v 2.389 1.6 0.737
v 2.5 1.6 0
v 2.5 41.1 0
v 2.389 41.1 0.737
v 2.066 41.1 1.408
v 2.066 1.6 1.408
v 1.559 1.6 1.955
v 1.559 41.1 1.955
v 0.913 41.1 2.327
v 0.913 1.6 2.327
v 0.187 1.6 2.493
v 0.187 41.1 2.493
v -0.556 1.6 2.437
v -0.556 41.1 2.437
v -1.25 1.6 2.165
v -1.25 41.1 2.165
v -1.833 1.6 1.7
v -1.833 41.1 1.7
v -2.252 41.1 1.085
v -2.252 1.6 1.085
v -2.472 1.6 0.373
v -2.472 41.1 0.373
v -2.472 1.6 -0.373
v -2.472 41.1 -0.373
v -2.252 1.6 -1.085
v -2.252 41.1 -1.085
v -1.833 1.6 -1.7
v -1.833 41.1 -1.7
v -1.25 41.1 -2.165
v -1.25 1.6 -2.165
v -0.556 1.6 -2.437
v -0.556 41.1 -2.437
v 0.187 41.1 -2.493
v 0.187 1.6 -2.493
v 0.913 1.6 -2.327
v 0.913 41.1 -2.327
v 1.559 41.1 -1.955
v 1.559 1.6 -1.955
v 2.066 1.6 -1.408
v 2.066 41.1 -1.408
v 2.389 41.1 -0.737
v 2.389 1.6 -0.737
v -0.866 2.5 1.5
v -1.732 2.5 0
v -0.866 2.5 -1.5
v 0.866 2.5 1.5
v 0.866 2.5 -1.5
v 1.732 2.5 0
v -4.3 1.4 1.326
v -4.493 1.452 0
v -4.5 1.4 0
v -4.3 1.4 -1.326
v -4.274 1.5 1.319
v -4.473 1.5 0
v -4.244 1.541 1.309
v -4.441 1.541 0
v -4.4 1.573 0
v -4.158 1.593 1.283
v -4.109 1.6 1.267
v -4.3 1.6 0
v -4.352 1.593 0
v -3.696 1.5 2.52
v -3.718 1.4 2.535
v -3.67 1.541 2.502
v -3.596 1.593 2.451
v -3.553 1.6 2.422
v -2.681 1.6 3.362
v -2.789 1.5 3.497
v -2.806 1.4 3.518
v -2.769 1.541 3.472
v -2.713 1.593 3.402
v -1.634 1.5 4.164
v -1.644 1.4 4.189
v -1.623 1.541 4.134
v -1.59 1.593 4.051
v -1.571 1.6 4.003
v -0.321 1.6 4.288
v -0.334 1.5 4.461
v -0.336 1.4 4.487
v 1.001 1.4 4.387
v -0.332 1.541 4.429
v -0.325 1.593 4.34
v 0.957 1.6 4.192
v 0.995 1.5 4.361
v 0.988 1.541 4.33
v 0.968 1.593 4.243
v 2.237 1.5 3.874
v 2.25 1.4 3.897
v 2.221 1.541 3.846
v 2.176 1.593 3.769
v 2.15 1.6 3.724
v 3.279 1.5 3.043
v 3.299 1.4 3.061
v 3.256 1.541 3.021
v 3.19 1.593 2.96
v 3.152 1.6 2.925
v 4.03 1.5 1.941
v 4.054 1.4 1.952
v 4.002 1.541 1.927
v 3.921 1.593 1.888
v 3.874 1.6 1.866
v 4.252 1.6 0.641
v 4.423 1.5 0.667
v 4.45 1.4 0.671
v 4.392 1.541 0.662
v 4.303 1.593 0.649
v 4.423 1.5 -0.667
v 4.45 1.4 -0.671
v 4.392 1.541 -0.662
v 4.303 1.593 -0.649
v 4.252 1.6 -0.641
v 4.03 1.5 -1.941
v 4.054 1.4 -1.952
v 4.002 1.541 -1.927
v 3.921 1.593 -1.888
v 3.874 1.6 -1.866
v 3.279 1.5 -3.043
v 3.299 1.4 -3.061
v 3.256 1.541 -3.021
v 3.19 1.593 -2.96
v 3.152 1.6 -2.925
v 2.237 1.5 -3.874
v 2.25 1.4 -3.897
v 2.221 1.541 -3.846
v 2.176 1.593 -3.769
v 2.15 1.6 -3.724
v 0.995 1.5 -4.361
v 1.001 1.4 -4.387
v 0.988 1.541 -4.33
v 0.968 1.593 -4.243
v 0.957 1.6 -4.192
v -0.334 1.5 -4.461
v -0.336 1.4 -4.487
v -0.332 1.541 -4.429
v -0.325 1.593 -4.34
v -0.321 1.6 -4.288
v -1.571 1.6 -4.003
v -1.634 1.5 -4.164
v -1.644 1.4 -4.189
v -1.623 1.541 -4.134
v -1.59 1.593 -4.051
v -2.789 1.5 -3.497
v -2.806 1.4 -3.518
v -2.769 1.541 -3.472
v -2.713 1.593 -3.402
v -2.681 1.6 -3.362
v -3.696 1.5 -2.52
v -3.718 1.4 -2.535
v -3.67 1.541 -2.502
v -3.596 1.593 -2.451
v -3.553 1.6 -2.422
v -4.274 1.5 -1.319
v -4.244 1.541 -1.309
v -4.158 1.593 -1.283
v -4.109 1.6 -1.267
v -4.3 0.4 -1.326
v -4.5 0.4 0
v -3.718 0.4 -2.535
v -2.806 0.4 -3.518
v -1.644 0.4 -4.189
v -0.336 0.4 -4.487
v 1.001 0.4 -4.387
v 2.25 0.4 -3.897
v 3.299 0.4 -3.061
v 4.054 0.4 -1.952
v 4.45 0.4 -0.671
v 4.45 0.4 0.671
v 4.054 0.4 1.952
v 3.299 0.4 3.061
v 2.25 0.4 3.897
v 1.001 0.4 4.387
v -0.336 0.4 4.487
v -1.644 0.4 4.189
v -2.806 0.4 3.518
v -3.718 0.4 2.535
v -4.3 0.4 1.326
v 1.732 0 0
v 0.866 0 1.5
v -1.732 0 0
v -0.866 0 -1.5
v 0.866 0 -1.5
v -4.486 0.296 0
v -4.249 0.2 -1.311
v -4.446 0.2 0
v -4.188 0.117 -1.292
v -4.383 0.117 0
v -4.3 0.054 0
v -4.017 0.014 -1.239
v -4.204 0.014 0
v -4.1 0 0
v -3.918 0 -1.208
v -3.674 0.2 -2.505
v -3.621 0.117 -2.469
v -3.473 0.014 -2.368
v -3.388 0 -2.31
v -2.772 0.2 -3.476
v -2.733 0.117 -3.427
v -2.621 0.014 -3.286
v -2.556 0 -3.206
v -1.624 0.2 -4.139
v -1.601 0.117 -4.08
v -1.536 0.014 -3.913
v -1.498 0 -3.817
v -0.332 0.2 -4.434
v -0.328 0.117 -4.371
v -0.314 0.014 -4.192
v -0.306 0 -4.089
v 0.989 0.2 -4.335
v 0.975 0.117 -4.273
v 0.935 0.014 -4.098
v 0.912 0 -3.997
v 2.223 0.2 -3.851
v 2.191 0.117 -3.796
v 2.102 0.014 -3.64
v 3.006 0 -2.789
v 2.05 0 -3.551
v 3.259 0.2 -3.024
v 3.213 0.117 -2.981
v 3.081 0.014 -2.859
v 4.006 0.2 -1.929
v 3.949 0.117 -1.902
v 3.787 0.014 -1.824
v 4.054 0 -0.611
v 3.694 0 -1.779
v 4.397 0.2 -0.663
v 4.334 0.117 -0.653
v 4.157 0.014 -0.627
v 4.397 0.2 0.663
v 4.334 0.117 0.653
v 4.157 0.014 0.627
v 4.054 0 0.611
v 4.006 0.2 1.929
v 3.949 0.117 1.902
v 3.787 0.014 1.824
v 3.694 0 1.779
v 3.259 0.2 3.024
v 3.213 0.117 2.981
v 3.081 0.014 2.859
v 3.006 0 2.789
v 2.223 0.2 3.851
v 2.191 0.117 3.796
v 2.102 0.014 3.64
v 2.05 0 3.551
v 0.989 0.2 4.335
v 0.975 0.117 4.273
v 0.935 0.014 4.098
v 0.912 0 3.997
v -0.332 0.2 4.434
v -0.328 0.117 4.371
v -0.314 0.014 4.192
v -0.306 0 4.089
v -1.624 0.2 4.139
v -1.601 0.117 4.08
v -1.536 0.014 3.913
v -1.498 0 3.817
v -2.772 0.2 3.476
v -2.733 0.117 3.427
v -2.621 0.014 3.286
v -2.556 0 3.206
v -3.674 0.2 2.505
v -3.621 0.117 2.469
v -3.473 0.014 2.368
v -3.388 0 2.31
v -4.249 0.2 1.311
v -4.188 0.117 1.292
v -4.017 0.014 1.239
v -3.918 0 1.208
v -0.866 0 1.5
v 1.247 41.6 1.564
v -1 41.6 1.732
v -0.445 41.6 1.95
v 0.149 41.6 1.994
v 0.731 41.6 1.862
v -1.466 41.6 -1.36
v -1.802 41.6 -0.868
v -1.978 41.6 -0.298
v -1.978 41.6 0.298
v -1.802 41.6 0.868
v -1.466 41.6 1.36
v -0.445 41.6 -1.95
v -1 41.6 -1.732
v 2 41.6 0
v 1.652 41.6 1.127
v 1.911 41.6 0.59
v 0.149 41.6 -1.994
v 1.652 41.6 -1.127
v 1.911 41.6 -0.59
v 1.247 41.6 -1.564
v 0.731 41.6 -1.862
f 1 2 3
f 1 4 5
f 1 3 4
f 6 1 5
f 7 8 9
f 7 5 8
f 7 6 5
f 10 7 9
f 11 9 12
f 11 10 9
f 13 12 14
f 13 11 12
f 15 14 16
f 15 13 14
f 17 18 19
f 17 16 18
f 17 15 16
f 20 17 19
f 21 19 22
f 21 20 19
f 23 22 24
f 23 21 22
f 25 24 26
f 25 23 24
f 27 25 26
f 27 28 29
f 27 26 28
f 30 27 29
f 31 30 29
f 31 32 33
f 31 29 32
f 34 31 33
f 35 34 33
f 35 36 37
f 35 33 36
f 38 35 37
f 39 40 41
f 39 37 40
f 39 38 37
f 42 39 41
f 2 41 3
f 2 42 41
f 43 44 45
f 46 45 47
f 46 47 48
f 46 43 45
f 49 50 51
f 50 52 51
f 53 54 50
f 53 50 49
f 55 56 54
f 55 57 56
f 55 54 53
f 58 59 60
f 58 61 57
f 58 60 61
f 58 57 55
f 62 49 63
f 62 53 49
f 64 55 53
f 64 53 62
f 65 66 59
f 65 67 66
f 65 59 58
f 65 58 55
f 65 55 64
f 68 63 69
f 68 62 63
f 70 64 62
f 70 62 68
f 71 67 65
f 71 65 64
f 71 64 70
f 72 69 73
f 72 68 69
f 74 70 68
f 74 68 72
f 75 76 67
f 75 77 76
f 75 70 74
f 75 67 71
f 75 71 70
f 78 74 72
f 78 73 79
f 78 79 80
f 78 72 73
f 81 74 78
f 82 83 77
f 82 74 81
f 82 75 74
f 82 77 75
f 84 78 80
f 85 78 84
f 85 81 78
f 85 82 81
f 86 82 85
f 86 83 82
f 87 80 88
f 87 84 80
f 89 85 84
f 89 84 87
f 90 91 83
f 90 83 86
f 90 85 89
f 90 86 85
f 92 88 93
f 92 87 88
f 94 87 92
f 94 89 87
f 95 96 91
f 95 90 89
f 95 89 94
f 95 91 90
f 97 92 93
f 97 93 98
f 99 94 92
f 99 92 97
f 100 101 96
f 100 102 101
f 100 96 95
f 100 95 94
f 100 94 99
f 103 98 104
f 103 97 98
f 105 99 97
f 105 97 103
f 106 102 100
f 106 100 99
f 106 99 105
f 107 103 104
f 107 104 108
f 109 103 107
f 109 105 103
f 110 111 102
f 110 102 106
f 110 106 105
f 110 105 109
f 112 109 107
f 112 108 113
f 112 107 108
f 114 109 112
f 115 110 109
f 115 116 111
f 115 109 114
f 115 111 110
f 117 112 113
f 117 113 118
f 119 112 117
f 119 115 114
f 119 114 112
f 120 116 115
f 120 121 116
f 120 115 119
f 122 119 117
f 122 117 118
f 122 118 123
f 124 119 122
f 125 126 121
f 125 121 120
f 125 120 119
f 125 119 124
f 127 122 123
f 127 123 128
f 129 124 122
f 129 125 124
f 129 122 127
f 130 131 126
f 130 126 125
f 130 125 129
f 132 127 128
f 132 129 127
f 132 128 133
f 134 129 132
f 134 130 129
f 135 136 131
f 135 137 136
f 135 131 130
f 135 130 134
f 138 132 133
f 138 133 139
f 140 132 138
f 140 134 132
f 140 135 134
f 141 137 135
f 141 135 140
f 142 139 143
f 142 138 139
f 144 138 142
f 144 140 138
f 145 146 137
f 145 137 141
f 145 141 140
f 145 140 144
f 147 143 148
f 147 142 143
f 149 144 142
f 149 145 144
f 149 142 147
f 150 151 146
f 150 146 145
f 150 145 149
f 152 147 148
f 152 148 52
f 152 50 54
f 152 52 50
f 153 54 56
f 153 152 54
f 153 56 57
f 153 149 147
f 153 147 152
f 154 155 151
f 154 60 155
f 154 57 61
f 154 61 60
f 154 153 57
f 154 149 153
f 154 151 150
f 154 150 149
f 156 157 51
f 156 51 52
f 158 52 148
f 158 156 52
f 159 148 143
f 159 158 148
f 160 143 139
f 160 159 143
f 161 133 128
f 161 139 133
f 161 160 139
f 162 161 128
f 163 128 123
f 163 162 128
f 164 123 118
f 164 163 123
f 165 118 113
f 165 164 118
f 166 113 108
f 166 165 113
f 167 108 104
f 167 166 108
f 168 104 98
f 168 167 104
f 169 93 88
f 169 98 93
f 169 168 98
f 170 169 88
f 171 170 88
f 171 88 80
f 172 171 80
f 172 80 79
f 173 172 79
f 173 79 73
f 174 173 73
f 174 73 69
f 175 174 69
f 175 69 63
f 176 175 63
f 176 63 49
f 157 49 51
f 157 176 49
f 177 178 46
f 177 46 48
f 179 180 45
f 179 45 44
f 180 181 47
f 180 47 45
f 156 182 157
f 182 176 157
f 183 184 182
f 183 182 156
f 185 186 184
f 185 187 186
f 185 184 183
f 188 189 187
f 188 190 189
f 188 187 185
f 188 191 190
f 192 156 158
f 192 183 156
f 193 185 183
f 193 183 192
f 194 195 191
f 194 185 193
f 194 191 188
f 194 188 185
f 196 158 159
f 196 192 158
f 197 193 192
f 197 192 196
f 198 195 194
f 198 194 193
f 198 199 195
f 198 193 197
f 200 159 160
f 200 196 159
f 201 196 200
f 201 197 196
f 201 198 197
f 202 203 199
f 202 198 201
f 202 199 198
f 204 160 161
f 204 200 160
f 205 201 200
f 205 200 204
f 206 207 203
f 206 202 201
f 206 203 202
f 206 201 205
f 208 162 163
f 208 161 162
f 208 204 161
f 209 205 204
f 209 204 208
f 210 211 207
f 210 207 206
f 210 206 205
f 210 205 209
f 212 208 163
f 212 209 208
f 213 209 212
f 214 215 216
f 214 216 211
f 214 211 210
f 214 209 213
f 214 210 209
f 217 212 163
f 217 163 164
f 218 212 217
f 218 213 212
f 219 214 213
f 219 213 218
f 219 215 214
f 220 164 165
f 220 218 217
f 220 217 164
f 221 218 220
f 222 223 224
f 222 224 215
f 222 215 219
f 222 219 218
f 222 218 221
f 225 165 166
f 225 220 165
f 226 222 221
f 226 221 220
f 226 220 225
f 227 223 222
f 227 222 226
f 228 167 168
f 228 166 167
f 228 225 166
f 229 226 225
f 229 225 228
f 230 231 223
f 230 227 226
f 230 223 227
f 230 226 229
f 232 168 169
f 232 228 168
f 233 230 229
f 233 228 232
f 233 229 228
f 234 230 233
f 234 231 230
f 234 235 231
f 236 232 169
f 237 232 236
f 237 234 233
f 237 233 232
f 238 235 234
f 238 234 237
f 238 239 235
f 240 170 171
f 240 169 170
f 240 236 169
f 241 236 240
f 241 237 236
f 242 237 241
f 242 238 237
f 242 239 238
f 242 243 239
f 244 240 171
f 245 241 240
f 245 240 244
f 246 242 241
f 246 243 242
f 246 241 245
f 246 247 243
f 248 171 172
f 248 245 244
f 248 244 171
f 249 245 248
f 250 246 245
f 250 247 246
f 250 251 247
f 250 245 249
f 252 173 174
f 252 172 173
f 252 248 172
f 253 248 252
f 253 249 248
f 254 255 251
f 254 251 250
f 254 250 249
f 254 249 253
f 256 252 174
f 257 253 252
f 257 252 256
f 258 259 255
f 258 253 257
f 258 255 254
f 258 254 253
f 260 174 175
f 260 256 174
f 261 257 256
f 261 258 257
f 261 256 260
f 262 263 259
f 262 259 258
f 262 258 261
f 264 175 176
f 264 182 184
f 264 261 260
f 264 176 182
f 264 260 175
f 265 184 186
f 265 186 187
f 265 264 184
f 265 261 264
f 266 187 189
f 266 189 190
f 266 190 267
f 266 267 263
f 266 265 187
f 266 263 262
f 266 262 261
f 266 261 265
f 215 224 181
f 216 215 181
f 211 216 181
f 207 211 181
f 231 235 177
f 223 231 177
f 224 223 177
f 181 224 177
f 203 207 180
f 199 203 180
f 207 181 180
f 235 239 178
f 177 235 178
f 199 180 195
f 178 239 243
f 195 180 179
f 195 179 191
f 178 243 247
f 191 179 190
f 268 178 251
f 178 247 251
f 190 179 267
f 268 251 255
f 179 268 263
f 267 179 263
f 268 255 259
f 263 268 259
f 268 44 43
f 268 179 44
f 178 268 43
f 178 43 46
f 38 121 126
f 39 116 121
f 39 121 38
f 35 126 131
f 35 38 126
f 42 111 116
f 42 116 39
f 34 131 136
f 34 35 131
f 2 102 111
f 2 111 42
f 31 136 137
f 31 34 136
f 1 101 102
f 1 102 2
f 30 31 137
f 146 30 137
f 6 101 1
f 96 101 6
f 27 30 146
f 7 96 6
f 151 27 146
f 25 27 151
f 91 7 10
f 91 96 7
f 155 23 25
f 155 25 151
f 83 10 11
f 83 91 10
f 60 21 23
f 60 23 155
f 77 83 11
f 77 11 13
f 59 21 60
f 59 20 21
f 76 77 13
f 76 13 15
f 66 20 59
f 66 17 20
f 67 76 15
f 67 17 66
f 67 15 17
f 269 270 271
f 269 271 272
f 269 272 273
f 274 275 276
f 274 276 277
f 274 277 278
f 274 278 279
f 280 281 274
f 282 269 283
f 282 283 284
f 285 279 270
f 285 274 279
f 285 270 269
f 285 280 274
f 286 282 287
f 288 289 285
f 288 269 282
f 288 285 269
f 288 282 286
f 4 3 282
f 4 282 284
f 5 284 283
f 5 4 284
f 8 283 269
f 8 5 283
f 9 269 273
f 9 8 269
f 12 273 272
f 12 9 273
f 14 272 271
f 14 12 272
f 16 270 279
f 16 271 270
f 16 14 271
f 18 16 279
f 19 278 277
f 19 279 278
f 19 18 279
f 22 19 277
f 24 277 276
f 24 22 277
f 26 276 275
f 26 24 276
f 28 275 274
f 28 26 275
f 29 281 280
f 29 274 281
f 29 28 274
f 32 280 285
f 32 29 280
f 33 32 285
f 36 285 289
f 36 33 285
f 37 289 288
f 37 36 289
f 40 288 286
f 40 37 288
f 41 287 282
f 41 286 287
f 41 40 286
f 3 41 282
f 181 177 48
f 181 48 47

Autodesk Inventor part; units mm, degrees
ref_plane "YZ Plane" through (0, 0, 0) normal (1, 0, 0) x (0, 1, 0)
ref_plane "XZ Plane" through (0, 0, 0) normal (0, 1, 0) x (-1, 0, 0)
ref_plane "XY Plane" through (0, 0, 0) normal (0, 0, 1) x (1, 0, 0)
sketch "Boceto1" plane through (0, 0, 0) normal (0, 1, 0) x (-1, 0, 0)
  circle A0 centre (0, 0) radius 4.5
  dimension "d0" = 9
extrude "Extrusión1" add sketch "Boceto1" along normal blind 1.6
sketch "Boceto2" plane through (0, 1.6, 0) normal (0, 1, 0) x (1, 0, 0)
  circle A0 centre (0, 0) radius 2.5
  dimension "d3" = 5
extrude "Extrusión2" add sketch "Boceto2" along normal blind 40
fillet "Empalme1" radius 0.4 1 edges at (4.5, 0, 0)
fillet "Empalme2" radius 0.2 1 edges at (4.5, 1.6, 0)
sketch "Boceto3" plane through (0, 0, 0) normal (0, -1, 0) x (1, 0, 0)
  line L0 (-1.7321, 0) -> (-0.866, 1.5)
  line L1 (-0.866, 1.5) -> (0.866, 1.5)
  line L2 (0.866, 1.5) -> (1.7321, 0)
  line L3 (1.7321, 0) -> (0.866, -1.5)
  line L4 (0.866, -1.5) -> (-0.866, -1.5)
  line L5 (-0.866, -1.5) -> (-1.7321, 0)
  point P0 (0, 0)
  point P1 (0, 0)
  dimension "d8" = 3
extrude "Extrusión3" cut sketch "Boceto3" against normal blind 2.5
chamfer "Chaflán1" distance 0.5 angle 45 1 edges at (-2.5, 41.6, 0)
thread "Rosca2" size "M5x0.8" class "6g" standard "ANSI Metric M Profile" length 12 offset 27
properties part number "Perno M5x8cabeza plana_" material "Hierro, gris"
